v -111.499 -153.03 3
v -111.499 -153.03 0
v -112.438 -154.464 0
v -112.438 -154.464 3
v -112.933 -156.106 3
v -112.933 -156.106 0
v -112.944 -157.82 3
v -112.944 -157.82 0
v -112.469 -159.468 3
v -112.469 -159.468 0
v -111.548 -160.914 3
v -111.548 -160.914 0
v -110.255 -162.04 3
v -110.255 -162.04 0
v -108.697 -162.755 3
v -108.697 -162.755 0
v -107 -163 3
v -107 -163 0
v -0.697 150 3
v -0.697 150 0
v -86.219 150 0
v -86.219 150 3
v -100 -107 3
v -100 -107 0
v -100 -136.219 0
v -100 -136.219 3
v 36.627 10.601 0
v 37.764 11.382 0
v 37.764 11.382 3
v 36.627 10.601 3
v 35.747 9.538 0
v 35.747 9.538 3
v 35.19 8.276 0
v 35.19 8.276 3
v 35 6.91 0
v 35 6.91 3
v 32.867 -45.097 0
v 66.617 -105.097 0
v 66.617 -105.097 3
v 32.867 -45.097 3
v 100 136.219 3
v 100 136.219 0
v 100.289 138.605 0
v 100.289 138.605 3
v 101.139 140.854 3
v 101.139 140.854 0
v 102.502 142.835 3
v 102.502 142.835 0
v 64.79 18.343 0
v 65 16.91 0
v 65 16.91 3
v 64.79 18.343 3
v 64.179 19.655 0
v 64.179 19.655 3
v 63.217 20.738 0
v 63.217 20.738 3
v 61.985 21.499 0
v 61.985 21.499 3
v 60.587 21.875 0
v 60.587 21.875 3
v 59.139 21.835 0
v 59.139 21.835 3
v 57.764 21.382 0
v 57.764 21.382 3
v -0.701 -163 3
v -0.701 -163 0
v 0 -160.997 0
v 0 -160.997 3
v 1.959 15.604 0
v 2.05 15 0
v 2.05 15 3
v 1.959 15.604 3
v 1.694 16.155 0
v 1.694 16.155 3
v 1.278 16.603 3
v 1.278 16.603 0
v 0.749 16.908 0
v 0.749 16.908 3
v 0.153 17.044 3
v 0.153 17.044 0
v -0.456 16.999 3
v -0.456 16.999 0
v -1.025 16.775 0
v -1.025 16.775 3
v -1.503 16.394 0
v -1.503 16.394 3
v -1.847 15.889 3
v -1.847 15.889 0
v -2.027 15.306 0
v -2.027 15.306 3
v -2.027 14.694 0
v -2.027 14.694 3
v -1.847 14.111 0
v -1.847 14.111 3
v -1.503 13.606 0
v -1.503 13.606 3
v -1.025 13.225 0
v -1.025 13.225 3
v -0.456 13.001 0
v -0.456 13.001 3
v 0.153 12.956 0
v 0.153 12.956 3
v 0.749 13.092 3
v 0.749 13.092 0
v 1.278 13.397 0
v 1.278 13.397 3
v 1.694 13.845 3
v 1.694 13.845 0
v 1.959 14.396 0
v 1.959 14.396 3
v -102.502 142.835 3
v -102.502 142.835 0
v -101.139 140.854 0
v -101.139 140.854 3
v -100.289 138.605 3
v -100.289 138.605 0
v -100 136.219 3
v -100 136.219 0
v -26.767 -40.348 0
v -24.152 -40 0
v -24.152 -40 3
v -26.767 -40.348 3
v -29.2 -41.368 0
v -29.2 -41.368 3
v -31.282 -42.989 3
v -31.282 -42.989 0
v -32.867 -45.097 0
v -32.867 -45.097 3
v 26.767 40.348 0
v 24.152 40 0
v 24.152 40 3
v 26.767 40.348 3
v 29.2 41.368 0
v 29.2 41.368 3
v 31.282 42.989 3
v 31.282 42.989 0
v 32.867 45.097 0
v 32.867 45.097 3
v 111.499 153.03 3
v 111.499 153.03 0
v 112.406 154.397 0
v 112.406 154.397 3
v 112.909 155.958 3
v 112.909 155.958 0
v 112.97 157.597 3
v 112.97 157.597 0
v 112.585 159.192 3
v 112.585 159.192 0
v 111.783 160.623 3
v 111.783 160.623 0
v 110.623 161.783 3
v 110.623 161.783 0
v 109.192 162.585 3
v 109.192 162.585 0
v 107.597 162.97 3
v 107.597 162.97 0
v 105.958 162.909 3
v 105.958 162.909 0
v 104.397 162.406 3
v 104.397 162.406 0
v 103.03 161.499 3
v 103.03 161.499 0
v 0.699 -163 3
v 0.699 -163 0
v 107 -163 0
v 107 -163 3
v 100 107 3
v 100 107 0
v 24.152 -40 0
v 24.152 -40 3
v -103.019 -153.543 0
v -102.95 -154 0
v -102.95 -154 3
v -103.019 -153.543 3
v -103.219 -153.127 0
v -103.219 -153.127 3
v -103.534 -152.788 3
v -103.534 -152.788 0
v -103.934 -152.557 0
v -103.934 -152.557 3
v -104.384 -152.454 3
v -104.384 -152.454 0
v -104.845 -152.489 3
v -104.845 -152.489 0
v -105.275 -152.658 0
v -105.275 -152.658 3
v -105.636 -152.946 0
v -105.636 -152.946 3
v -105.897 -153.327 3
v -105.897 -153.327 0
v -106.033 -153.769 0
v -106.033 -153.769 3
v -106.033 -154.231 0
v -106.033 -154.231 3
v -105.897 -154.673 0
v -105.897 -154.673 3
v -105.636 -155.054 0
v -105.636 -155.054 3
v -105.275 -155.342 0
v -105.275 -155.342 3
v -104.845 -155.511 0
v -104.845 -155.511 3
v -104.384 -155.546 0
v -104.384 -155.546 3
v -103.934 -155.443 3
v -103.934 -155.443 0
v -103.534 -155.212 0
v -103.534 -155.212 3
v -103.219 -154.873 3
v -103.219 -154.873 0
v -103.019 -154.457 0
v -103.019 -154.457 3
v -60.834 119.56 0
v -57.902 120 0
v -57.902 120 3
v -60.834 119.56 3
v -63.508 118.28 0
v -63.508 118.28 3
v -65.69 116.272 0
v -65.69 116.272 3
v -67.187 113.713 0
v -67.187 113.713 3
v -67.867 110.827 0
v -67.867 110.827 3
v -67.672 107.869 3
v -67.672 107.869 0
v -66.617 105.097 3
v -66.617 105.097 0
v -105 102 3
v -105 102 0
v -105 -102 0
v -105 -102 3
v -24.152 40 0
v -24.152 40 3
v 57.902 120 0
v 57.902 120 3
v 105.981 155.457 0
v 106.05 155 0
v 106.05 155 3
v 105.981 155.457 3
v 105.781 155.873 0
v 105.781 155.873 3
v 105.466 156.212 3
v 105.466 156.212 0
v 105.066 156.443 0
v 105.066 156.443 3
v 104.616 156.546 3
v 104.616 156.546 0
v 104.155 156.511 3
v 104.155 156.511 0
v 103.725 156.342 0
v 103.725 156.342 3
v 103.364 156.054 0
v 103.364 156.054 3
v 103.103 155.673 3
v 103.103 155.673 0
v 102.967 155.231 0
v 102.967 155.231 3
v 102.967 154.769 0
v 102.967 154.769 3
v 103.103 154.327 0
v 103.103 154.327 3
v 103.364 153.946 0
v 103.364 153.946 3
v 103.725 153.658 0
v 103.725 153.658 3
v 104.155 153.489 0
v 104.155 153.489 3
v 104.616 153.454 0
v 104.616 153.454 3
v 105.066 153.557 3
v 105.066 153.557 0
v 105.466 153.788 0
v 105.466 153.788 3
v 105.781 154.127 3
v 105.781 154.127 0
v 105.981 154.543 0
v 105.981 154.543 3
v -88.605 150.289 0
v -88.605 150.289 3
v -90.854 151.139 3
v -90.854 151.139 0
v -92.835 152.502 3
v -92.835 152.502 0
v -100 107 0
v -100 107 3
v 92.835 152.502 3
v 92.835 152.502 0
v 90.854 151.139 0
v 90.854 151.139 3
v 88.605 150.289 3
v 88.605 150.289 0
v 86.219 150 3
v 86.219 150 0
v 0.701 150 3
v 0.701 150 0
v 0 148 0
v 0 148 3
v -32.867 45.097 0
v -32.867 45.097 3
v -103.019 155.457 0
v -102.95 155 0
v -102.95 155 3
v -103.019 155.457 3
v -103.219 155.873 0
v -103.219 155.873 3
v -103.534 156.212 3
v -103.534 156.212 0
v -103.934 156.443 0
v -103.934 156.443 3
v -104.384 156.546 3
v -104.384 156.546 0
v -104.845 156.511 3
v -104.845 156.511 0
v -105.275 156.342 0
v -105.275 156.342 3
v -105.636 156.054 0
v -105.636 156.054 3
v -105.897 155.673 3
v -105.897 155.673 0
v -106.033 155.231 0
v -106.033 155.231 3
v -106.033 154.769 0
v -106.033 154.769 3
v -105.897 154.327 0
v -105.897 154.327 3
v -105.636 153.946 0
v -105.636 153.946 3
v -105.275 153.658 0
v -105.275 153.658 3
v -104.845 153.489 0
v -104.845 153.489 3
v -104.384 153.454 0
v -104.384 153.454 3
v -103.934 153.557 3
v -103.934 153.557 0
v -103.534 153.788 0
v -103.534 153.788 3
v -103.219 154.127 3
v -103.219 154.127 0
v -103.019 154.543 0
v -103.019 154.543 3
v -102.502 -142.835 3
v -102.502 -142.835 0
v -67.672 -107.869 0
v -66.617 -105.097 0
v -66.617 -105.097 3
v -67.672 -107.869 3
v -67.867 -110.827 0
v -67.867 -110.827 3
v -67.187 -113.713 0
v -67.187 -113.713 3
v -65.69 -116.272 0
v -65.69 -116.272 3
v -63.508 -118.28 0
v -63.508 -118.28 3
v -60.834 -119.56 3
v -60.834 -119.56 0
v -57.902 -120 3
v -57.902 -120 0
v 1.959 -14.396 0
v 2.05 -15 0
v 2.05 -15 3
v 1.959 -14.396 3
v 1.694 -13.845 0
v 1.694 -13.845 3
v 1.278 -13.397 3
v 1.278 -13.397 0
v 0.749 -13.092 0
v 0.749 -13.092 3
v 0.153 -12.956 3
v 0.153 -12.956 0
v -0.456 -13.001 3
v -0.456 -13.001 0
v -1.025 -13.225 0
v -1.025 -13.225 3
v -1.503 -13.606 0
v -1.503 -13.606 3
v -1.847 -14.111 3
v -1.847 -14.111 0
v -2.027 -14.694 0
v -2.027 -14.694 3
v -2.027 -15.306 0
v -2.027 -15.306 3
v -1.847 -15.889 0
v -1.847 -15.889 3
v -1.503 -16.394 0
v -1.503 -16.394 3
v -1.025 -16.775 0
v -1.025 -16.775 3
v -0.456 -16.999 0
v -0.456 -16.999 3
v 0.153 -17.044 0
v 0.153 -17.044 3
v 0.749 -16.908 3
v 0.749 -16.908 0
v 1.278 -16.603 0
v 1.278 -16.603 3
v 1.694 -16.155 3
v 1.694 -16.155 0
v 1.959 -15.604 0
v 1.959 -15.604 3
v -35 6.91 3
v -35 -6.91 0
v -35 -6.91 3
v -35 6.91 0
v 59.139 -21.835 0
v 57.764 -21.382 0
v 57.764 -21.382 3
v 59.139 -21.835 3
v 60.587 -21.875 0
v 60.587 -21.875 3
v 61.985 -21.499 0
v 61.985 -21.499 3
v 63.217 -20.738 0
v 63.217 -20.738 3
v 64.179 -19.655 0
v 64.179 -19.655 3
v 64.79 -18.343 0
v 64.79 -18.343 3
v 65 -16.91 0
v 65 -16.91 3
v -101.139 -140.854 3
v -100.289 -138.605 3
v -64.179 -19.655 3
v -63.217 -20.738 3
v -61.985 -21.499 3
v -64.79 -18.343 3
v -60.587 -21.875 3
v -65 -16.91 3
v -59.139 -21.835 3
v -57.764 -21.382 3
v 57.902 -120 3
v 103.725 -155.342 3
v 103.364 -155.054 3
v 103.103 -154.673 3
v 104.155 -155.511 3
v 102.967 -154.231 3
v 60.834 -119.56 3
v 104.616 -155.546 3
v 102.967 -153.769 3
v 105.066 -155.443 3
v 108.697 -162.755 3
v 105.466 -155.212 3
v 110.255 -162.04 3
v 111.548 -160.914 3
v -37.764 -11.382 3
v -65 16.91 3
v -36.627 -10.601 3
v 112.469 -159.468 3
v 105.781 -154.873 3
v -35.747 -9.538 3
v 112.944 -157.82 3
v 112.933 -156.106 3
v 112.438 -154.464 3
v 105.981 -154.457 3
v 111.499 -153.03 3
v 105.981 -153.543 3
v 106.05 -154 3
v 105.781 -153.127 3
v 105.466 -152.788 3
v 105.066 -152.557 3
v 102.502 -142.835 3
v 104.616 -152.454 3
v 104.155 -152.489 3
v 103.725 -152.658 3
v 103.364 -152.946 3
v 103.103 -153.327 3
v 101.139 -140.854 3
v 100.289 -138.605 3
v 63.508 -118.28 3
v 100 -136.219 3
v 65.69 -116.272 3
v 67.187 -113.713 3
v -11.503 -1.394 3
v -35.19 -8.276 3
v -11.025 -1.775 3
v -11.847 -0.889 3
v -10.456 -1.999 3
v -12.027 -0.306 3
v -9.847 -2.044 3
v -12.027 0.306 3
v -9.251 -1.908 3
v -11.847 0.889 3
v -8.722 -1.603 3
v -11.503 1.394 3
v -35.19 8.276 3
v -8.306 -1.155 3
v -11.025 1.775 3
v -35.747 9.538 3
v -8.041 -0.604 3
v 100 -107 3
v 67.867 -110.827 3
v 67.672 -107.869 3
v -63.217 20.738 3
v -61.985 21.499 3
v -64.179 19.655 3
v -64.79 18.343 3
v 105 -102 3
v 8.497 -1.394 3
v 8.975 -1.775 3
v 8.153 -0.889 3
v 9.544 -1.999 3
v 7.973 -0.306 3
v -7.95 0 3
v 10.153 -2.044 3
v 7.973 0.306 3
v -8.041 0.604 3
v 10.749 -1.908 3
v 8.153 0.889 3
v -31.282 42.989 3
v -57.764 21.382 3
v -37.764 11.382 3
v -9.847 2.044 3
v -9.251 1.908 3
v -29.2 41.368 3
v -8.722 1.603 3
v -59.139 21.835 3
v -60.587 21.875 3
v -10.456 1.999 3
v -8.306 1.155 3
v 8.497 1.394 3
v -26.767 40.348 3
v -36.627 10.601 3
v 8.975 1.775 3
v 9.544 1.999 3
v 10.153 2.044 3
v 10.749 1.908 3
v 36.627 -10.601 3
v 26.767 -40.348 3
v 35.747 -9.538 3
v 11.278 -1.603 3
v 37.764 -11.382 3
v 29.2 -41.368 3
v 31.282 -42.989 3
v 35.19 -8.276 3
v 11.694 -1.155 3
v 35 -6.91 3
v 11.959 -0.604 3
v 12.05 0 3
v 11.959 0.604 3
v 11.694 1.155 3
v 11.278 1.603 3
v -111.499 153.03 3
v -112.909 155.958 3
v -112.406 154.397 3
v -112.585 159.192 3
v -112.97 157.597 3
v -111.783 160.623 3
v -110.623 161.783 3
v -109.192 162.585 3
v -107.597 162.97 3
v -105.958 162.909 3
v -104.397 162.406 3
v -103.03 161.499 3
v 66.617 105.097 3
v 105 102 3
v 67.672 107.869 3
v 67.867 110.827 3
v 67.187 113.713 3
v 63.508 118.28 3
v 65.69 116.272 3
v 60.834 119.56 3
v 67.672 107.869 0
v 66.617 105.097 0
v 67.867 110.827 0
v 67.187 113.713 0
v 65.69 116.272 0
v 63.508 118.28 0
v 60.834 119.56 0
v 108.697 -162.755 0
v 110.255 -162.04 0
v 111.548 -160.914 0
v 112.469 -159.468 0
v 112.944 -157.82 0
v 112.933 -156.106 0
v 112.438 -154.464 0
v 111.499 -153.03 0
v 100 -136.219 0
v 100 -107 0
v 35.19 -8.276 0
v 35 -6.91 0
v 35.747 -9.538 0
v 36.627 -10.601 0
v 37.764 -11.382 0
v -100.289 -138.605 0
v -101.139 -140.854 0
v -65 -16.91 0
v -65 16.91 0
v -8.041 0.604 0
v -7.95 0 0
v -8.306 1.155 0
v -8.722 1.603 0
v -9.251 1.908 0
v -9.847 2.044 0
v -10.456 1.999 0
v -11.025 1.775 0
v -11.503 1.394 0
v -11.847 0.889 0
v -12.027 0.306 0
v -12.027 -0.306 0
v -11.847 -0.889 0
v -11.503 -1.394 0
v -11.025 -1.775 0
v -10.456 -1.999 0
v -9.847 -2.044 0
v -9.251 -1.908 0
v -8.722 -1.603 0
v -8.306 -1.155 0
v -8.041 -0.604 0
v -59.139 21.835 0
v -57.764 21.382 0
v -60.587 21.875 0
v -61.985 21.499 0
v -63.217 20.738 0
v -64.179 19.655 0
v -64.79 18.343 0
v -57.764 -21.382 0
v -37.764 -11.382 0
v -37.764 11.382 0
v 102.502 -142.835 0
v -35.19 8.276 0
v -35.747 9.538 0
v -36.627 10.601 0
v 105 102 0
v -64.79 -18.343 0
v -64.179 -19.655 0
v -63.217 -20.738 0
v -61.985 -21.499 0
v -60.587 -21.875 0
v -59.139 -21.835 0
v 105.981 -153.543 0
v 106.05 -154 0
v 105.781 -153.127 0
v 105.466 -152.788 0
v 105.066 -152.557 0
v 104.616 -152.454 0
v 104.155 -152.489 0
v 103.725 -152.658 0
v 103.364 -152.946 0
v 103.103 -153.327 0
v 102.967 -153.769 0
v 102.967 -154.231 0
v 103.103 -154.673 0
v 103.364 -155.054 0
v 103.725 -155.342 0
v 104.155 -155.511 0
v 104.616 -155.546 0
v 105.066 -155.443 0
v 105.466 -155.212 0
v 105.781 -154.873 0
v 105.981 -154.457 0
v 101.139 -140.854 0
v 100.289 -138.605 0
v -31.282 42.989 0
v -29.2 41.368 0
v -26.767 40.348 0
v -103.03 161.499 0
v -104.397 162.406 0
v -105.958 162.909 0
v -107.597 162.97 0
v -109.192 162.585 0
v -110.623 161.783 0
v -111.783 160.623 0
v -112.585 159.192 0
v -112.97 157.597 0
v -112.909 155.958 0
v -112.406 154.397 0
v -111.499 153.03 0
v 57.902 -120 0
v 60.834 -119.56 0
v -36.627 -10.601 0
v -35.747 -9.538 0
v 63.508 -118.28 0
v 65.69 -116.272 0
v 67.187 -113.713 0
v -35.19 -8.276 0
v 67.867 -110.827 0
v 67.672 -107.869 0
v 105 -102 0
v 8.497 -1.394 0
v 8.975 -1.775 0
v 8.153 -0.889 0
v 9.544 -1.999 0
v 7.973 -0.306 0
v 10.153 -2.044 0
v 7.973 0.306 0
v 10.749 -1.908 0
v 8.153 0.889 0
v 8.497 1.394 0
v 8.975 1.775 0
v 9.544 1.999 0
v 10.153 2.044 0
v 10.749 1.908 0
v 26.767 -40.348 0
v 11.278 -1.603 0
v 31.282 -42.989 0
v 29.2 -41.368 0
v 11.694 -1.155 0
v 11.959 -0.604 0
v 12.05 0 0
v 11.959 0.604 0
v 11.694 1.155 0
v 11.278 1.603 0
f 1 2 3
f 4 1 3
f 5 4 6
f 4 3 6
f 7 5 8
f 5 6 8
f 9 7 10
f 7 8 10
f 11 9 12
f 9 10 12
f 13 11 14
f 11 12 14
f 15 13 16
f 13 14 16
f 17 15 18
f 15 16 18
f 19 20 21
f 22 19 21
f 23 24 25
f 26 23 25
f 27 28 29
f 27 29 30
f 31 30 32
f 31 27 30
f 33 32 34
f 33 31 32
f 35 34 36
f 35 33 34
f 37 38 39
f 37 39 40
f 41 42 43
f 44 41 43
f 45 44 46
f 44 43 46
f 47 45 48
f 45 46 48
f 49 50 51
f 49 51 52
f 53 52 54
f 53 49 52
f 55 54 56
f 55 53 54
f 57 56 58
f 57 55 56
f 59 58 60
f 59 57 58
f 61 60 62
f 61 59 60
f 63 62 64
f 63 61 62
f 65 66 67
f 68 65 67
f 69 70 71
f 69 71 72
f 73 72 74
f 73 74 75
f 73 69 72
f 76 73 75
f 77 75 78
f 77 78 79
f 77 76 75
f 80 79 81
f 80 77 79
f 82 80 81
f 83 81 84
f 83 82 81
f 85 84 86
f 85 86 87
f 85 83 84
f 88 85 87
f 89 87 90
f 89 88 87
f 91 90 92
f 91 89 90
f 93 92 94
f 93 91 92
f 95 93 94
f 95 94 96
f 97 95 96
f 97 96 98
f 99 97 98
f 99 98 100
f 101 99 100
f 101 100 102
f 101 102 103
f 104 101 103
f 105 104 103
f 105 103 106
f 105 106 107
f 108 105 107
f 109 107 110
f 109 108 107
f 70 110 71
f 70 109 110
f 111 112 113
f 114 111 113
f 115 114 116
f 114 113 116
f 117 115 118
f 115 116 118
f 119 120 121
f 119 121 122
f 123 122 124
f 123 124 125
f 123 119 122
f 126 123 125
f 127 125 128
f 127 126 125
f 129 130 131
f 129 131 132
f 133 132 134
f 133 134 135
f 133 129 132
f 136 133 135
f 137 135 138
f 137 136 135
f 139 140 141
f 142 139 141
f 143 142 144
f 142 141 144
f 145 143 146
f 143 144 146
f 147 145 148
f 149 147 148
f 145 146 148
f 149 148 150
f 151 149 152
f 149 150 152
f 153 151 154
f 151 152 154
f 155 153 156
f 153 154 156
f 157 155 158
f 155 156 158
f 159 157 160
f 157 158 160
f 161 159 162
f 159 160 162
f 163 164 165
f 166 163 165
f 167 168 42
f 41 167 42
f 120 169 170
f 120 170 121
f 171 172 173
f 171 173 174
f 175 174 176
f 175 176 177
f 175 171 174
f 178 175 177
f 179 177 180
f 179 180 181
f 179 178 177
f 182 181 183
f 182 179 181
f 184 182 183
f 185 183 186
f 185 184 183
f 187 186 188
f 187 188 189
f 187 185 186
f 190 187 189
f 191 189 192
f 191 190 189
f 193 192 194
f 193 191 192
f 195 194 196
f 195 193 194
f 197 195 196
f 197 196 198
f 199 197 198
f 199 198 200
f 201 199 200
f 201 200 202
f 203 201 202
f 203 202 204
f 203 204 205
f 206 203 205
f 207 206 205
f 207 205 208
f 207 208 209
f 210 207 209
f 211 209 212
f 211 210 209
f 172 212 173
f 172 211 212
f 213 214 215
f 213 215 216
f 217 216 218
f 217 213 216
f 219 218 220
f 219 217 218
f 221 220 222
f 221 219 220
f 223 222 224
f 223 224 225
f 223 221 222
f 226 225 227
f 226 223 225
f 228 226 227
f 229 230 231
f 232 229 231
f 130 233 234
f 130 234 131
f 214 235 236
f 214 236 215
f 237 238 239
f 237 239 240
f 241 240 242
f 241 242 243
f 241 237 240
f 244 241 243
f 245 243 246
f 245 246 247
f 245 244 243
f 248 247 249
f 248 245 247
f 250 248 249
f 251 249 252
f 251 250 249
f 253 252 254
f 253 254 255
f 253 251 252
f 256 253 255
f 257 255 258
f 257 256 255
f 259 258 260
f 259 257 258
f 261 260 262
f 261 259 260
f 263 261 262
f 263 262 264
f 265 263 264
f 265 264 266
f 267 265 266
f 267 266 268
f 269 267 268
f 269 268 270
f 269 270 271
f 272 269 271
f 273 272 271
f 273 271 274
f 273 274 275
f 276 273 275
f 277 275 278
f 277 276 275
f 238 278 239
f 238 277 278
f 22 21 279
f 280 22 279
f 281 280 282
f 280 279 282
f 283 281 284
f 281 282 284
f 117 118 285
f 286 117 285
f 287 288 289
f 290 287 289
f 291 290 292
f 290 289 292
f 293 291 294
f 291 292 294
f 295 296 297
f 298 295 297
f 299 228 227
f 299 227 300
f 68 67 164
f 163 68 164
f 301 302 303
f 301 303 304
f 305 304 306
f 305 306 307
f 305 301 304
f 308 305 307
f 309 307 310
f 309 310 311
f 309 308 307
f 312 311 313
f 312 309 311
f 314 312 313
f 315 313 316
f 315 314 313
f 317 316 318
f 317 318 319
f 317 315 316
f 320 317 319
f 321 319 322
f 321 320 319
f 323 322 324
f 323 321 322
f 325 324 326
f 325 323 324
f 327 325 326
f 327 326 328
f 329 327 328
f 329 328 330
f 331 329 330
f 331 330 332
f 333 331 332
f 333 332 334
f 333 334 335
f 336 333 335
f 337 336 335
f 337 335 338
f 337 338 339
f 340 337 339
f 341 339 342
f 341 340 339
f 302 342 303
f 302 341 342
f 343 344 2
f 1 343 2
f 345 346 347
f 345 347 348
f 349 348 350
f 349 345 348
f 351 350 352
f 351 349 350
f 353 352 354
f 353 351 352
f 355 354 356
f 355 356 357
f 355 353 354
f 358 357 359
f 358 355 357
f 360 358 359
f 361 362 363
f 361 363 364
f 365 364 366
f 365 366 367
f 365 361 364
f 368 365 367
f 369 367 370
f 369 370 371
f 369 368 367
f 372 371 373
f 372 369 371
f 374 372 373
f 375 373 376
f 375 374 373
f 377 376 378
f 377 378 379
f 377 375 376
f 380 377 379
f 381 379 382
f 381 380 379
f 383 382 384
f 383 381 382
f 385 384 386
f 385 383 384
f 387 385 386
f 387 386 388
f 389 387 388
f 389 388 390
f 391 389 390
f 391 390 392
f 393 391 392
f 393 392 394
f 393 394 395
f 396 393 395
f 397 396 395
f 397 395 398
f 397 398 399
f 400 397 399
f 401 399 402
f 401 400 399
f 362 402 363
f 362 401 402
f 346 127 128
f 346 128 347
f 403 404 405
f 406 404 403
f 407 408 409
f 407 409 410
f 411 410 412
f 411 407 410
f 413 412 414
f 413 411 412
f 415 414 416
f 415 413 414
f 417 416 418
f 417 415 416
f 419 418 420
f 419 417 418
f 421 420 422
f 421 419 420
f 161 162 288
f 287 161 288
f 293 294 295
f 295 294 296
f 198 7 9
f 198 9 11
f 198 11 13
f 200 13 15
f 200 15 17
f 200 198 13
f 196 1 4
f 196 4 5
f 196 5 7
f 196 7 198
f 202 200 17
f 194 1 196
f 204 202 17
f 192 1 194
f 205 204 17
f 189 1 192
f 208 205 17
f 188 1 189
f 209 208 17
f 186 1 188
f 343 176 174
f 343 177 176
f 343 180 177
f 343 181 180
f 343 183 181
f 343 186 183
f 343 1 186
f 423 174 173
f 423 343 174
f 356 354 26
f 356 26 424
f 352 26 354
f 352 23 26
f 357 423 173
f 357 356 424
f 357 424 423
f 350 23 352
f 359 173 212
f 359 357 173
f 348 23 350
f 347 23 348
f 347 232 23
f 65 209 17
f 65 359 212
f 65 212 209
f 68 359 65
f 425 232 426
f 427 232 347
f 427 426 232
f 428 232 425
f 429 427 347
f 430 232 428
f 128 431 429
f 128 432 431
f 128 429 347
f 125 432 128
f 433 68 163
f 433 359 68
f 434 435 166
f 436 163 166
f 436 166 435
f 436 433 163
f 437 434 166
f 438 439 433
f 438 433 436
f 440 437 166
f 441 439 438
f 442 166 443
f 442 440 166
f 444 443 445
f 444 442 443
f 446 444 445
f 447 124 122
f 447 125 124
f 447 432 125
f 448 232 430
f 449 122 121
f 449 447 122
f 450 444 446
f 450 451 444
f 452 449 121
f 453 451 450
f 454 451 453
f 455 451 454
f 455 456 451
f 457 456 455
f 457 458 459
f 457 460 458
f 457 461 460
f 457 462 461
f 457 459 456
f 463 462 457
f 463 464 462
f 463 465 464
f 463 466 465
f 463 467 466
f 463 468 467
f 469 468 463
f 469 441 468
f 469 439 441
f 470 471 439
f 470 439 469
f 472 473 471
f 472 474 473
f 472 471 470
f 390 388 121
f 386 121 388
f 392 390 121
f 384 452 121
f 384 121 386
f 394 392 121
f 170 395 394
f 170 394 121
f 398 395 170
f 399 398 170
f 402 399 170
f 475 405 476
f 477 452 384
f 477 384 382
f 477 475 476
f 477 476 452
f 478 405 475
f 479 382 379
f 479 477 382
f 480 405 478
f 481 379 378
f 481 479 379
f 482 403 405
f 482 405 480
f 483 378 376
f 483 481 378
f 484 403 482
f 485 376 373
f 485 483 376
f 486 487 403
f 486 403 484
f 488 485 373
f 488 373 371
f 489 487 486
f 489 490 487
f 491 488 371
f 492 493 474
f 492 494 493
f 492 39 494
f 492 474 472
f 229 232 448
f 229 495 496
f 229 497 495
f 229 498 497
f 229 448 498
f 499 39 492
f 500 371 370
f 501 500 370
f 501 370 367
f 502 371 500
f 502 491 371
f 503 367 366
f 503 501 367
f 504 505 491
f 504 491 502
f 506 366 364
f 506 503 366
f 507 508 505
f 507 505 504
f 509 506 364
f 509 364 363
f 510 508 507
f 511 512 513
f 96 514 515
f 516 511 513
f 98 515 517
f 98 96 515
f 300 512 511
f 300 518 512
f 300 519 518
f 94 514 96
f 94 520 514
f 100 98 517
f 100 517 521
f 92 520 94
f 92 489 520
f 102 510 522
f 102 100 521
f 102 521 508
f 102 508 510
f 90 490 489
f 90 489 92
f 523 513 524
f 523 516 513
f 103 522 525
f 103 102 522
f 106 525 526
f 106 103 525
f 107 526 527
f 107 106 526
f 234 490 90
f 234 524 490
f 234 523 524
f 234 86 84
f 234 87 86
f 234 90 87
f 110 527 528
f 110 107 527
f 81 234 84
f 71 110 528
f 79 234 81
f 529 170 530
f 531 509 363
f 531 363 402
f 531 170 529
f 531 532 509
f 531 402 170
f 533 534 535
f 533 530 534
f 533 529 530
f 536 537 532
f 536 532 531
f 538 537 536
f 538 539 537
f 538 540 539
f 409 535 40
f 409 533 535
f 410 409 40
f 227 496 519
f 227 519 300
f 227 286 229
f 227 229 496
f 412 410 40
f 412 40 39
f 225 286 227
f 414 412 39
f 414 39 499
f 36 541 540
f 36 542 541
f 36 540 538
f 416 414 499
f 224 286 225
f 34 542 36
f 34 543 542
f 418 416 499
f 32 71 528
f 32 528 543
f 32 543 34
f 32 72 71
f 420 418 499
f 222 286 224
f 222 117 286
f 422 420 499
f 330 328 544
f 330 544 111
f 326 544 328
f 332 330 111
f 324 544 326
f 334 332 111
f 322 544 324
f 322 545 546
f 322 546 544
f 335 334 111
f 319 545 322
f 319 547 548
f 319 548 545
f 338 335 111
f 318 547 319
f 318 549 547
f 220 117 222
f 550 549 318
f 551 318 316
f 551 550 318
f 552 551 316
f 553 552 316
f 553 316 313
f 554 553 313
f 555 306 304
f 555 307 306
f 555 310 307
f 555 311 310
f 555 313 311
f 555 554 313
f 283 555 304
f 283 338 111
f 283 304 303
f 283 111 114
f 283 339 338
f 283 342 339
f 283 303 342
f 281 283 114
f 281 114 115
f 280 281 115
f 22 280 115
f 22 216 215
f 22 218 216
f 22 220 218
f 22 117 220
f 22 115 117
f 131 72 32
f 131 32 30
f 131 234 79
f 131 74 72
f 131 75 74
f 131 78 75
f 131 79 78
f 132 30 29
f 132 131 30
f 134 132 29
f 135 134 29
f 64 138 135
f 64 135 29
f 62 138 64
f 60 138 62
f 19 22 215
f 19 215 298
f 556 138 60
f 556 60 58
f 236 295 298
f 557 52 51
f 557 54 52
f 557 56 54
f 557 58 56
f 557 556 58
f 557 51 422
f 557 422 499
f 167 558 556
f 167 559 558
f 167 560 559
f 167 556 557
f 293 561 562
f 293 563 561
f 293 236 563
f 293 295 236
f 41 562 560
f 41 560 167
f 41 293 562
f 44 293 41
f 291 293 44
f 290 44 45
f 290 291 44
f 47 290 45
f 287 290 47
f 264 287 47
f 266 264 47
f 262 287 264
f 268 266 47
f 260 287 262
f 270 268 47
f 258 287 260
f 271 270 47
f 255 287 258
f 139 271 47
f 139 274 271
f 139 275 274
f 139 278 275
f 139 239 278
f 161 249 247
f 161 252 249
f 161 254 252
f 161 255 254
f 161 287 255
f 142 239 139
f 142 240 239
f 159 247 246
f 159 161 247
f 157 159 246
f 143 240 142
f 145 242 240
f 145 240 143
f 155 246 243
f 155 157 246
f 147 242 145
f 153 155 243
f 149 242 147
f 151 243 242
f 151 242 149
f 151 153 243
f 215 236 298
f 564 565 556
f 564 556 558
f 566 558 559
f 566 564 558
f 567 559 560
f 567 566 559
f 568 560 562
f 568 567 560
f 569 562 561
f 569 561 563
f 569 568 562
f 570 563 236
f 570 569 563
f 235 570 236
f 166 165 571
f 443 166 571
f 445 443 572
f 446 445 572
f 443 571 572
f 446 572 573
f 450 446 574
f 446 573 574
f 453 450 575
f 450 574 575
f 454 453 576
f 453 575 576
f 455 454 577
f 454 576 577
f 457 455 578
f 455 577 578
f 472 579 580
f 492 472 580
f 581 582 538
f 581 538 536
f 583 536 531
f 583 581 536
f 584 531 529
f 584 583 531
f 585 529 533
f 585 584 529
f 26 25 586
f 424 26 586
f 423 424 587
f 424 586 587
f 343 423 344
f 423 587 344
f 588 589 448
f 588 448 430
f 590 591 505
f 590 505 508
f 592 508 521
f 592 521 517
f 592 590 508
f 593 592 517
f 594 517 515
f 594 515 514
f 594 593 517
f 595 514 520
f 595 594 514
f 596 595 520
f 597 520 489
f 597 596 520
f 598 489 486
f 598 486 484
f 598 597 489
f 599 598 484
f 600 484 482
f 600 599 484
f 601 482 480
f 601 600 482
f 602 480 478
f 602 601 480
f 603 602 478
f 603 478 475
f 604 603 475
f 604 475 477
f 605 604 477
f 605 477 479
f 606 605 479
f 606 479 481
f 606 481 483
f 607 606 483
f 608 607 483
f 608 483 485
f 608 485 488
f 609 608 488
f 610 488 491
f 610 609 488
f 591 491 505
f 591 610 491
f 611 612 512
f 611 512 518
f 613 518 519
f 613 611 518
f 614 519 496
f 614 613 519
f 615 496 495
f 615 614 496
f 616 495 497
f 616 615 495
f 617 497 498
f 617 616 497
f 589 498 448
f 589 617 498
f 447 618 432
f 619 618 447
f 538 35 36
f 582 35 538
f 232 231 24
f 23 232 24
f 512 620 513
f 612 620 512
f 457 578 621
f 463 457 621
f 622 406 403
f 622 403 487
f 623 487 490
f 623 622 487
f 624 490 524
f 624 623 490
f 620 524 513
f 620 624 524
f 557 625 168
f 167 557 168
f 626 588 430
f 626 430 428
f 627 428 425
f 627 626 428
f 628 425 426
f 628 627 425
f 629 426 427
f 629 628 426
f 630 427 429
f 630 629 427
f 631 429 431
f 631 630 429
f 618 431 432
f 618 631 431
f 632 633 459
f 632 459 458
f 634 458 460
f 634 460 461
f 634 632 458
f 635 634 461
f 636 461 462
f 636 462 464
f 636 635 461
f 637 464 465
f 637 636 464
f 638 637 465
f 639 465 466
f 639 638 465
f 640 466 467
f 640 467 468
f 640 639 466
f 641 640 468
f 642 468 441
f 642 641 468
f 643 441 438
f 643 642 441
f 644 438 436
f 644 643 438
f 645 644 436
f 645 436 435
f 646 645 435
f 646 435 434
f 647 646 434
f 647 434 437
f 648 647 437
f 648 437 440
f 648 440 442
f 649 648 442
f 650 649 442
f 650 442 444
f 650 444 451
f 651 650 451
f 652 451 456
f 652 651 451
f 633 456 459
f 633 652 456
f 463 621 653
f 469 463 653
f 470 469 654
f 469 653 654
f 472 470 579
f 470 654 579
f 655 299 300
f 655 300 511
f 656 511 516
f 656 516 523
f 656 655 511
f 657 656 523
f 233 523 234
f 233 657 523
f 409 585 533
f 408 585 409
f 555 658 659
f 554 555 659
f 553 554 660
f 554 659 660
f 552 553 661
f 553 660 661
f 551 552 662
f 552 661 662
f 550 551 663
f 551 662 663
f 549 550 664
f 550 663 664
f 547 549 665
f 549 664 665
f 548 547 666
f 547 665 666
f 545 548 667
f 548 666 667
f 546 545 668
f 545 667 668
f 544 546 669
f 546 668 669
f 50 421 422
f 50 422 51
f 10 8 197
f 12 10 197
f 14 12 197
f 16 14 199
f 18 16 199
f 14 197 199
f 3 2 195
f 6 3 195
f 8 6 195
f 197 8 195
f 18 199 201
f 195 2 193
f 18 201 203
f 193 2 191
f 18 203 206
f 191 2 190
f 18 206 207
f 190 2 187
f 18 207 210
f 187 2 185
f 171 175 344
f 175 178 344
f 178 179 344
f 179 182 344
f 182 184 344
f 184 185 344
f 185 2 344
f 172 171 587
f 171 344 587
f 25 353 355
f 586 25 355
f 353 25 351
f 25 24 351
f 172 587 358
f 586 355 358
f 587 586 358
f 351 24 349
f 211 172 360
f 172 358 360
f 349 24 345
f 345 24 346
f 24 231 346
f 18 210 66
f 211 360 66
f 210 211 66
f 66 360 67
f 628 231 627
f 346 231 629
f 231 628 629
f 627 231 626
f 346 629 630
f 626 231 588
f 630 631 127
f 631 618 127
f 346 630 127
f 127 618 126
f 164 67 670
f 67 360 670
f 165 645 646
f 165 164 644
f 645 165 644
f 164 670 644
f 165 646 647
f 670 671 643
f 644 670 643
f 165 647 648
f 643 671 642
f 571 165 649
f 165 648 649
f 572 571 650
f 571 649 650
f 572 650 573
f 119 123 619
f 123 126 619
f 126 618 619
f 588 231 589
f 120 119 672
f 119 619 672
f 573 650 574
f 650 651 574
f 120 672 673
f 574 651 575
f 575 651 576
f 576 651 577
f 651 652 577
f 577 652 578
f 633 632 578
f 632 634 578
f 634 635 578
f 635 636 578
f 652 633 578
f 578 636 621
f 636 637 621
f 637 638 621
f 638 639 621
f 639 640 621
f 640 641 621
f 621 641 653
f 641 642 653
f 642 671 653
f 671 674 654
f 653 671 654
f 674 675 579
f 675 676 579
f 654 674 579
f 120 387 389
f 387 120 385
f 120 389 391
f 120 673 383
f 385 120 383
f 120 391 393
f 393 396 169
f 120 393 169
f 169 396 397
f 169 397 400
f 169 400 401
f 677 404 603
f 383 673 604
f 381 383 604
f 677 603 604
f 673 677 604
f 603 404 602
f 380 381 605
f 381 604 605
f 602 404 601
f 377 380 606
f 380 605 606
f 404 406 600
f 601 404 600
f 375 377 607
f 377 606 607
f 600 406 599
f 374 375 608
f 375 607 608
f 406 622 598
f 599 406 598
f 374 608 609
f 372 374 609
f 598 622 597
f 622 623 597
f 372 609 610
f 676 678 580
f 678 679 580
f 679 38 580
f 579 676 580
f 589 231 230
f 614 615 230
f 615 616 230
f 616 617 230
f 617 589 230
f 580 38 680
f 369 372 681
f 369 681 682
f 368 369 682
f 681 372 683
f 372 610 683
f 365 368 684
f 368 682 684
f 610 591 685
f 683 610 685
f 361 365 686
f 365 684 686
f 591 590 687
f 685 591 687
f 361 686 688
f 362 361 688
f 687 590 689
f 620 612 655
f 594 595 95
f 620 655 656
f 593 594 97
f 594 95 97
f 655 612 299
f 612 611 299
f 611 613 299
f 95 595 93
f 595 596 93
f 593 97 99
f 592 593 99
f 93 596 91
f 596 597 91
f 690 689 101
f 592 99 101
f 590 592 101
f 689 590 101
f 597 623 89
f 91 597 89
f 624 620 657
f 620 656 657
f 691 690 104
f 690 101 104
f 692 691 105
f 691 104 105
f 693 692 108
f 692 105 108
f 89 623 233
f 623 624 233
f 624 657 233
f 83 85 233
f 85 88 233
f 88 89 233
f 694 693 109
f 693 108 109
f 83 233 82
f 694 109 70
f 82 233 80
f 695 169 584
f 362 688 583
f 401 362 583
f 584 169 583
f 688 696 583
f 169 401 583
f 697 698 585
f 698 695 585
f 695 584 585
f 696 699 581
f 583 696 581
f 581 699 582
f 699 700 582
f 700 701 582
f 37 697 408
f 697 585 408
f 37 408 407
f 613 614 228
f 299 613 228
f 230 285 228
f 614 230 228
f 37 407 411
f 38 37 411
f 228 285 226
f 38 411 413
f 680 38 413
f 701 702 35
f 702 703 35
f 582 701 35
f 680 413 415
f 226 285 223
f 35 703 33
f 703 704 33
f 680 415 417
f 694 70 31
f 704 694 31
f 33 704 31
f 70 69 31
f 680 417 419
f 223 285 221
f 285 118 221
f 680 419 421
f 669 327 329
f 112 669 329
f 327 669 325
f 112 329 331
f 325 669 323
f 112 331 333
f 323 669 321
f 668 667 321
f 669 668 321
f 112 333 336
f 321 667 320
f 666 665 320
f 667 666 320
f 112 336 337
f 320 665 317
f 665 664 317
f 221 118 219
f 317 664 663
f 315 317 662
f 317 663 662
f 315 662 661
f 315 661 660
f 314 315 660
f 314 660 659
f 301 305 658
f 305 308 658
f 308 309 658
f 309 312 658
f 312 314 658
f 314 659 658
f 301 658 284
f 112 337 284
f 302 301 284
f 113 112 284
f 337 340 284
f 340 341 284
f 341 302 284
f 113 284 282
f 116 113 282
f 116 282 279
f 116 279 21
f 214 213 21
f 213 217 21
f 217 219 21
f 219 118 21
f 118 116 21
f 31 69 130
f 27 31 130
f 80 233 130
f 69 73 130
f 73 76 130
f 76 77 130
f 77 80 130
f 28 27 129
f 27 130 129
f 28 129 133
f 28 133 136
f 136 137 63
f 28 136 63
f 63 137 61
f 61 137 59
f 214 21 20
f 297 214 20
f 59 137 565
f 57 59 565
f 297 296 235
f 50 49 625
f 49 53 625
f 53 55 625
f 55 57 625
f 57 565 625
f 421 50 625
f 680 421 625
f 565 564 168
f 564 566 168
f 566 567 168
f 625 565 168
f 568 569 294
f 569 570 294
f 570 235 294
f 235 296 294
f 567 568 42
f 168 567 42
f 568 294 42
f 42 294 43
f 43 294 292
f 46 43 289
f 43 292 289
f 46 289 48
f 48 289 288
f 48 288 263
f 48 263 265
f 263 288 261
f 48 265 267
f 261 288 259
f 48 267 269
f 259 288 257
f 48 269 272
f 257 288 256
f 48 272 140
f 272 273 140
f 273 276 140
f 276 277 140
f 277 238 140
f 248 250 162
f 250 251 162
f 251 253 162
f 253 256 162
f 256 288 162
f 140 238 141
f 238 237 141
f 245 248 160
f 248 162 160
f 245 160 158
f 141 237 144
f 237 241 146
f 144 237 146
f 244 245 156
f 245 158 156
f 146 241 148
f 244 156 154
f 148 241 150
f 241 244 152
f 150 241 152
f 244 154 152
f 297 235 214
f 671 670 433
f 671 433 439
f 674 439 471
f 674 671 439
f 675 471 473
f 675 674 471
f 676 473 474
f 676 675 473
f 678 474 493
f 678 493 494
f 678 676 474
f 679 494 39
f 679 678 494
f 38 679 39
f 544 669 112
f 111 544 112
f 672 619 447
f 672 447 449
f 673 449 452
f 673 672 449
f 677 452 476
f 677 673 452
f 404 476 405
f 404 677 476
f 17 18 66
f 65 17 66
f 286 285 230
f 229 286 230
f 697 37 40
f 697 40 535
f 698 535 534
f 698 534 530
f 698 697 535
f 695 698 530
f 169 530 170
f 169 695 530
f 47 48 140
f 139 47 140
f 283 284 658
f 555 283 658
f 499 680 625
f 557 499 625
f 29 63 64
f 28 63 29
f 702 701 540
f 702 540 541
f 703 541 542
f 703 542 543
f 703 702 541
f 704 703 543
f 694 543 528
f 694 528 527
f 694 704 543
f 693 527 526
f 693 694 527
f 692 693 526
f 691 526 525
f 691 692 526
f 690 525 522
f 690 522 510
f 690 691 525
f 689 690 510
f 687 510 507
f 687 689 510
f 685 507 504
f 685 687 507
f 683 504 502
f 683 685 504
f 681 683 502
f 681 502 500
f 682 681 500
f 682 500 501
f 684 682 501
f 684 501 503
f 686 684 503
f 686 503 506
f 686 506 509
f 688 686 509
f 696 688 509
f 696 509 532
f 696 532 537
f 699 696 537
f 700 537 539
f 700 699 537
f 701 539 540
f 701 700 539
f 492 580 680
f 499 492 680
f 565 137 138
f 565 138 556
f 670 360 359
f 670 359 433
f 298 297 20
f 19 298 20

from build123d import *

# Parameters (mm, degrees)
MODEL_R                 = 1.55
MODEL_R_2               = 2.05
SALIENTE_EXTRUIR1_DEPTH = 3


with BuildPart() as part:
    # Model → Saliente-Extruir1 (new body)
    with BuildSketch(Plane.XY):
        with BuildLine():
            Line((-102.502115315, -142.835304077), (-111.498730811, -153.029934372))
            ThreePointArc((-111.498730811, -153.029934372), (-112.469021565, -159.467752645), (-107, -163))
            Line((-107, -163), (-0.700702433, -163))
            Line((-0.700702433, -163), (0, -160.996661892))
            Line((0, -160.996661892), (0.699463472, -163))
            Line((0.699463472, -163), (107, -163))
            ThreePointArc((107, -163), (112.469021565, -159.467752645), (111.498730811, -153.029934372))
            Line((111.498730811, -153.029934372), (102.502115315, -142.835304077))
            ThreePointArc((102.502115315, -142.835304077), (100.646421892, -139.755557374), (100, -136.21852803))
            Line((100, -136.21852803), (100, -107))
            Line((100, -107), (105, -102))
            Line((105, -102), (105, 102))
            Line((105, 102), (100, 107))
            Line((100, 107), (100, 136.21852803))
            ThreePointArc((100, 136.21852803), (100.646421892, 139.755557374), (102.502115315, 142.835304077))
            Line((102.502115315, 142.835304077), (111.498730811, 153.029934372))
            ThreePointArc((111.498730811, 153.029934372), (111.242640687, 161.242640687), (103.029934372, 161.498730811))
            Line((103.029934372, 161.498730811), (92.835304077, 152.502115315))
            ThreePointArc((92.835304077, 152.502115315), (89.755557374, 150.646421892), (86.21852803, 150))
            Line((86.21852803, 150), (0.701283747, 150))
            Line((0.701283747, 150), (0, 148))
            Line((0, 148), (-0.697387345, 150))
            Line((-0.697387345, 150), (-86.21852803, 150))
            ThreePointArc((-86.21852803, 150), (-89.755557374, 150.646421892), (-92.835304077, 152.502115315))
            Line((-92.835304077, 152.502115315), (-103.029934372, 161.498730811))
            ThreePointArc((-103.029934372, 161.498730811), (-111.242640687, 161.242640687), (-111.498730811, 153.029934372))
            Line((-111.498730811, 153.029934372), (-102.502115315, 142.835304077))
            ThreePointArc((-102.502115315, 142.835304077), (-100.646421892, 139.755557374), (-100, 136.21852803))
            Line((-100, 136.21852803), (-100, 107))
            Line((-100, 107), (-105, 102))
            Line((-105, 102), (-105, -102))
            Line((-105, -102), (-100, -107))
            Line((-100, -107), (-100, -136.21852803))
            ThreePointArc((-100, -136.21852803), (-100.646421892, -139.755557374), (-102.502115315, -142.835304077))
        make_face()
        with Locations((-104.5, -154)):
            Circle(MODEL_R, mode=Mode.SUBTRACT)
        with Locations((104.5, -154)):
            Circle(MODEL_R, mode=Mode.SUBTRACT)
        with Locations((-10, 0)):
            Circle(MODEL_R_2, mode=Mode.SUBTRACT)
        with Locations((0, -15)):
            Circle(MODEL_R_2, mode=Mode.SUBTRACT)
        with Locations((10, 0)):
            Circle(MODEL_R_2, mode=Mode.SUBTRACT)
        with Locations((0, 15)):
            Circle(MODEL_R_2, mode=Mode.SUBTRACT)
        with Locations((104.5, 155)):
            Circle(MODEL_R, mode=Mode.SUBTRACT)
        with Locations((-104.5, 155)):
            Circle(MODEL_R, mode=Mode.SUBTRACT)
        with BuildLine():
            Line((24.151525156, -40), (-24.151525156, -40))
            ThreePointArc((-24.151525156, -40), (-29.19998413, -41.367905122), (-32.867280527, -45.097387604))
            Line((-32.867280527, -45.097387604), (-66.617280527, -105.097387604))
            ThreePointArc((-66.617280527, -105.097387604), (-66.533620034, -115.048458975), (-57.901525156, -120))
            Line((-57.901525156, -120), (57.901525156, -120))
            ThreePointArc((57.901525156, -120), (66.533620034, -115.048458975), (66.617280527, -105.097387604))
            Line((66.617280527, -105.097387604), (32.867280527, -45.097387604))
            ThreePointArc((32.867280527, -45.097387604), (29.19998413, -41.367905122), (24.151525156, -40))
        make_face(mode=Mode.SUBTRACT)
        with BuildLine():
            Line((32.867280527, 45.097387604), (66.617280527, 105.097387604))
            ThreePointArc((66.617280527, 105.097387604), (66.533620034, 115.048458975), (57.901525156, 120))
            Line((57.901525156, 120), (-57.901525156, 120))
            ThreePointArc((-57.901525156, 120), (-66.533620034, 115.048458975), (-66.617280527, 105.097387604))
            Line((-66.617280527, 105.097387604), (-32.867280527, 45.097387604))
            ThreePointArc((-32.867280527, 45.097387604), (-29.19998413, 41.367905122), (-24.151525156, 40))
            Line((-24.151525156, 40), (24.151525156, 40))
            ThreePointArc((24.151525156, 40), (29.19998413, 41.367905122), (32.867280527, 45.097387604))
        make_face(mode=Mode.SUBTRACT)
        with BuildLine():
            Line((-37.763932023, 11.381966011), (-57.763932023, 21.381966011))
            ThreePointArc((-57.763932023, 21.381966011), (-62.628655561, 21.163084098), (-65, 16.909830056))
            Line((-65, 16.909830056), (-65, -16.909830056))
            ThreePointArc((-65, -16.909830056), (-62.628655561, -21.163084098), (-57.763932023, -21.381966011))
            Line((-57.763932023, -21.381966011), (-37.763932023, -11.381966011))
            ThreePointArc((-37.763932023, -11.381966011), (-35.746745958, -9.538485617), (-35, -6.909830056))
            Line((-35, -6.909830056), (-35, 6.909830056))
            ThreePointArc((-35, 6.909830056), (-35.746745958, 9.538485617), (-37.763932023, 11.381966011))
        make_face(mode=Mode.SUBTRACT)
        with BuildLine():
            Line((37.763932023, -11.381966011), (57.763932023, -21.381966011))
            ThreePointArc((57.763932023, -21.381966011), (62.628655561, -21.163084098), (65, -16.909830056))
            Line((65, -16.909830056), (65, 16.909830056))
            ThreePointArc((65, 16.909830056), (62.628655561, 21.163084098), (57.763932023, 21.381966011))
            Line((57.763932023, 21.381966011), (37.763932023, 11.381966011))
            ThreePointArc((37.763932023, 11.381966011), (35.746745958, 9.538485617), (35, 6.909830056))
            Line((35, 6.909830056), (35, -6.909830056))
            ThreePointArc((35, -6.909830056), (35.746745958, -9.538485617), (37.763932023, -11.381966011))
        make_face(mode=Mode.SUBTRACT)
    extrude(amount=SALIENTE_EXTRUIR1_DEPTH)


solid = part.part
